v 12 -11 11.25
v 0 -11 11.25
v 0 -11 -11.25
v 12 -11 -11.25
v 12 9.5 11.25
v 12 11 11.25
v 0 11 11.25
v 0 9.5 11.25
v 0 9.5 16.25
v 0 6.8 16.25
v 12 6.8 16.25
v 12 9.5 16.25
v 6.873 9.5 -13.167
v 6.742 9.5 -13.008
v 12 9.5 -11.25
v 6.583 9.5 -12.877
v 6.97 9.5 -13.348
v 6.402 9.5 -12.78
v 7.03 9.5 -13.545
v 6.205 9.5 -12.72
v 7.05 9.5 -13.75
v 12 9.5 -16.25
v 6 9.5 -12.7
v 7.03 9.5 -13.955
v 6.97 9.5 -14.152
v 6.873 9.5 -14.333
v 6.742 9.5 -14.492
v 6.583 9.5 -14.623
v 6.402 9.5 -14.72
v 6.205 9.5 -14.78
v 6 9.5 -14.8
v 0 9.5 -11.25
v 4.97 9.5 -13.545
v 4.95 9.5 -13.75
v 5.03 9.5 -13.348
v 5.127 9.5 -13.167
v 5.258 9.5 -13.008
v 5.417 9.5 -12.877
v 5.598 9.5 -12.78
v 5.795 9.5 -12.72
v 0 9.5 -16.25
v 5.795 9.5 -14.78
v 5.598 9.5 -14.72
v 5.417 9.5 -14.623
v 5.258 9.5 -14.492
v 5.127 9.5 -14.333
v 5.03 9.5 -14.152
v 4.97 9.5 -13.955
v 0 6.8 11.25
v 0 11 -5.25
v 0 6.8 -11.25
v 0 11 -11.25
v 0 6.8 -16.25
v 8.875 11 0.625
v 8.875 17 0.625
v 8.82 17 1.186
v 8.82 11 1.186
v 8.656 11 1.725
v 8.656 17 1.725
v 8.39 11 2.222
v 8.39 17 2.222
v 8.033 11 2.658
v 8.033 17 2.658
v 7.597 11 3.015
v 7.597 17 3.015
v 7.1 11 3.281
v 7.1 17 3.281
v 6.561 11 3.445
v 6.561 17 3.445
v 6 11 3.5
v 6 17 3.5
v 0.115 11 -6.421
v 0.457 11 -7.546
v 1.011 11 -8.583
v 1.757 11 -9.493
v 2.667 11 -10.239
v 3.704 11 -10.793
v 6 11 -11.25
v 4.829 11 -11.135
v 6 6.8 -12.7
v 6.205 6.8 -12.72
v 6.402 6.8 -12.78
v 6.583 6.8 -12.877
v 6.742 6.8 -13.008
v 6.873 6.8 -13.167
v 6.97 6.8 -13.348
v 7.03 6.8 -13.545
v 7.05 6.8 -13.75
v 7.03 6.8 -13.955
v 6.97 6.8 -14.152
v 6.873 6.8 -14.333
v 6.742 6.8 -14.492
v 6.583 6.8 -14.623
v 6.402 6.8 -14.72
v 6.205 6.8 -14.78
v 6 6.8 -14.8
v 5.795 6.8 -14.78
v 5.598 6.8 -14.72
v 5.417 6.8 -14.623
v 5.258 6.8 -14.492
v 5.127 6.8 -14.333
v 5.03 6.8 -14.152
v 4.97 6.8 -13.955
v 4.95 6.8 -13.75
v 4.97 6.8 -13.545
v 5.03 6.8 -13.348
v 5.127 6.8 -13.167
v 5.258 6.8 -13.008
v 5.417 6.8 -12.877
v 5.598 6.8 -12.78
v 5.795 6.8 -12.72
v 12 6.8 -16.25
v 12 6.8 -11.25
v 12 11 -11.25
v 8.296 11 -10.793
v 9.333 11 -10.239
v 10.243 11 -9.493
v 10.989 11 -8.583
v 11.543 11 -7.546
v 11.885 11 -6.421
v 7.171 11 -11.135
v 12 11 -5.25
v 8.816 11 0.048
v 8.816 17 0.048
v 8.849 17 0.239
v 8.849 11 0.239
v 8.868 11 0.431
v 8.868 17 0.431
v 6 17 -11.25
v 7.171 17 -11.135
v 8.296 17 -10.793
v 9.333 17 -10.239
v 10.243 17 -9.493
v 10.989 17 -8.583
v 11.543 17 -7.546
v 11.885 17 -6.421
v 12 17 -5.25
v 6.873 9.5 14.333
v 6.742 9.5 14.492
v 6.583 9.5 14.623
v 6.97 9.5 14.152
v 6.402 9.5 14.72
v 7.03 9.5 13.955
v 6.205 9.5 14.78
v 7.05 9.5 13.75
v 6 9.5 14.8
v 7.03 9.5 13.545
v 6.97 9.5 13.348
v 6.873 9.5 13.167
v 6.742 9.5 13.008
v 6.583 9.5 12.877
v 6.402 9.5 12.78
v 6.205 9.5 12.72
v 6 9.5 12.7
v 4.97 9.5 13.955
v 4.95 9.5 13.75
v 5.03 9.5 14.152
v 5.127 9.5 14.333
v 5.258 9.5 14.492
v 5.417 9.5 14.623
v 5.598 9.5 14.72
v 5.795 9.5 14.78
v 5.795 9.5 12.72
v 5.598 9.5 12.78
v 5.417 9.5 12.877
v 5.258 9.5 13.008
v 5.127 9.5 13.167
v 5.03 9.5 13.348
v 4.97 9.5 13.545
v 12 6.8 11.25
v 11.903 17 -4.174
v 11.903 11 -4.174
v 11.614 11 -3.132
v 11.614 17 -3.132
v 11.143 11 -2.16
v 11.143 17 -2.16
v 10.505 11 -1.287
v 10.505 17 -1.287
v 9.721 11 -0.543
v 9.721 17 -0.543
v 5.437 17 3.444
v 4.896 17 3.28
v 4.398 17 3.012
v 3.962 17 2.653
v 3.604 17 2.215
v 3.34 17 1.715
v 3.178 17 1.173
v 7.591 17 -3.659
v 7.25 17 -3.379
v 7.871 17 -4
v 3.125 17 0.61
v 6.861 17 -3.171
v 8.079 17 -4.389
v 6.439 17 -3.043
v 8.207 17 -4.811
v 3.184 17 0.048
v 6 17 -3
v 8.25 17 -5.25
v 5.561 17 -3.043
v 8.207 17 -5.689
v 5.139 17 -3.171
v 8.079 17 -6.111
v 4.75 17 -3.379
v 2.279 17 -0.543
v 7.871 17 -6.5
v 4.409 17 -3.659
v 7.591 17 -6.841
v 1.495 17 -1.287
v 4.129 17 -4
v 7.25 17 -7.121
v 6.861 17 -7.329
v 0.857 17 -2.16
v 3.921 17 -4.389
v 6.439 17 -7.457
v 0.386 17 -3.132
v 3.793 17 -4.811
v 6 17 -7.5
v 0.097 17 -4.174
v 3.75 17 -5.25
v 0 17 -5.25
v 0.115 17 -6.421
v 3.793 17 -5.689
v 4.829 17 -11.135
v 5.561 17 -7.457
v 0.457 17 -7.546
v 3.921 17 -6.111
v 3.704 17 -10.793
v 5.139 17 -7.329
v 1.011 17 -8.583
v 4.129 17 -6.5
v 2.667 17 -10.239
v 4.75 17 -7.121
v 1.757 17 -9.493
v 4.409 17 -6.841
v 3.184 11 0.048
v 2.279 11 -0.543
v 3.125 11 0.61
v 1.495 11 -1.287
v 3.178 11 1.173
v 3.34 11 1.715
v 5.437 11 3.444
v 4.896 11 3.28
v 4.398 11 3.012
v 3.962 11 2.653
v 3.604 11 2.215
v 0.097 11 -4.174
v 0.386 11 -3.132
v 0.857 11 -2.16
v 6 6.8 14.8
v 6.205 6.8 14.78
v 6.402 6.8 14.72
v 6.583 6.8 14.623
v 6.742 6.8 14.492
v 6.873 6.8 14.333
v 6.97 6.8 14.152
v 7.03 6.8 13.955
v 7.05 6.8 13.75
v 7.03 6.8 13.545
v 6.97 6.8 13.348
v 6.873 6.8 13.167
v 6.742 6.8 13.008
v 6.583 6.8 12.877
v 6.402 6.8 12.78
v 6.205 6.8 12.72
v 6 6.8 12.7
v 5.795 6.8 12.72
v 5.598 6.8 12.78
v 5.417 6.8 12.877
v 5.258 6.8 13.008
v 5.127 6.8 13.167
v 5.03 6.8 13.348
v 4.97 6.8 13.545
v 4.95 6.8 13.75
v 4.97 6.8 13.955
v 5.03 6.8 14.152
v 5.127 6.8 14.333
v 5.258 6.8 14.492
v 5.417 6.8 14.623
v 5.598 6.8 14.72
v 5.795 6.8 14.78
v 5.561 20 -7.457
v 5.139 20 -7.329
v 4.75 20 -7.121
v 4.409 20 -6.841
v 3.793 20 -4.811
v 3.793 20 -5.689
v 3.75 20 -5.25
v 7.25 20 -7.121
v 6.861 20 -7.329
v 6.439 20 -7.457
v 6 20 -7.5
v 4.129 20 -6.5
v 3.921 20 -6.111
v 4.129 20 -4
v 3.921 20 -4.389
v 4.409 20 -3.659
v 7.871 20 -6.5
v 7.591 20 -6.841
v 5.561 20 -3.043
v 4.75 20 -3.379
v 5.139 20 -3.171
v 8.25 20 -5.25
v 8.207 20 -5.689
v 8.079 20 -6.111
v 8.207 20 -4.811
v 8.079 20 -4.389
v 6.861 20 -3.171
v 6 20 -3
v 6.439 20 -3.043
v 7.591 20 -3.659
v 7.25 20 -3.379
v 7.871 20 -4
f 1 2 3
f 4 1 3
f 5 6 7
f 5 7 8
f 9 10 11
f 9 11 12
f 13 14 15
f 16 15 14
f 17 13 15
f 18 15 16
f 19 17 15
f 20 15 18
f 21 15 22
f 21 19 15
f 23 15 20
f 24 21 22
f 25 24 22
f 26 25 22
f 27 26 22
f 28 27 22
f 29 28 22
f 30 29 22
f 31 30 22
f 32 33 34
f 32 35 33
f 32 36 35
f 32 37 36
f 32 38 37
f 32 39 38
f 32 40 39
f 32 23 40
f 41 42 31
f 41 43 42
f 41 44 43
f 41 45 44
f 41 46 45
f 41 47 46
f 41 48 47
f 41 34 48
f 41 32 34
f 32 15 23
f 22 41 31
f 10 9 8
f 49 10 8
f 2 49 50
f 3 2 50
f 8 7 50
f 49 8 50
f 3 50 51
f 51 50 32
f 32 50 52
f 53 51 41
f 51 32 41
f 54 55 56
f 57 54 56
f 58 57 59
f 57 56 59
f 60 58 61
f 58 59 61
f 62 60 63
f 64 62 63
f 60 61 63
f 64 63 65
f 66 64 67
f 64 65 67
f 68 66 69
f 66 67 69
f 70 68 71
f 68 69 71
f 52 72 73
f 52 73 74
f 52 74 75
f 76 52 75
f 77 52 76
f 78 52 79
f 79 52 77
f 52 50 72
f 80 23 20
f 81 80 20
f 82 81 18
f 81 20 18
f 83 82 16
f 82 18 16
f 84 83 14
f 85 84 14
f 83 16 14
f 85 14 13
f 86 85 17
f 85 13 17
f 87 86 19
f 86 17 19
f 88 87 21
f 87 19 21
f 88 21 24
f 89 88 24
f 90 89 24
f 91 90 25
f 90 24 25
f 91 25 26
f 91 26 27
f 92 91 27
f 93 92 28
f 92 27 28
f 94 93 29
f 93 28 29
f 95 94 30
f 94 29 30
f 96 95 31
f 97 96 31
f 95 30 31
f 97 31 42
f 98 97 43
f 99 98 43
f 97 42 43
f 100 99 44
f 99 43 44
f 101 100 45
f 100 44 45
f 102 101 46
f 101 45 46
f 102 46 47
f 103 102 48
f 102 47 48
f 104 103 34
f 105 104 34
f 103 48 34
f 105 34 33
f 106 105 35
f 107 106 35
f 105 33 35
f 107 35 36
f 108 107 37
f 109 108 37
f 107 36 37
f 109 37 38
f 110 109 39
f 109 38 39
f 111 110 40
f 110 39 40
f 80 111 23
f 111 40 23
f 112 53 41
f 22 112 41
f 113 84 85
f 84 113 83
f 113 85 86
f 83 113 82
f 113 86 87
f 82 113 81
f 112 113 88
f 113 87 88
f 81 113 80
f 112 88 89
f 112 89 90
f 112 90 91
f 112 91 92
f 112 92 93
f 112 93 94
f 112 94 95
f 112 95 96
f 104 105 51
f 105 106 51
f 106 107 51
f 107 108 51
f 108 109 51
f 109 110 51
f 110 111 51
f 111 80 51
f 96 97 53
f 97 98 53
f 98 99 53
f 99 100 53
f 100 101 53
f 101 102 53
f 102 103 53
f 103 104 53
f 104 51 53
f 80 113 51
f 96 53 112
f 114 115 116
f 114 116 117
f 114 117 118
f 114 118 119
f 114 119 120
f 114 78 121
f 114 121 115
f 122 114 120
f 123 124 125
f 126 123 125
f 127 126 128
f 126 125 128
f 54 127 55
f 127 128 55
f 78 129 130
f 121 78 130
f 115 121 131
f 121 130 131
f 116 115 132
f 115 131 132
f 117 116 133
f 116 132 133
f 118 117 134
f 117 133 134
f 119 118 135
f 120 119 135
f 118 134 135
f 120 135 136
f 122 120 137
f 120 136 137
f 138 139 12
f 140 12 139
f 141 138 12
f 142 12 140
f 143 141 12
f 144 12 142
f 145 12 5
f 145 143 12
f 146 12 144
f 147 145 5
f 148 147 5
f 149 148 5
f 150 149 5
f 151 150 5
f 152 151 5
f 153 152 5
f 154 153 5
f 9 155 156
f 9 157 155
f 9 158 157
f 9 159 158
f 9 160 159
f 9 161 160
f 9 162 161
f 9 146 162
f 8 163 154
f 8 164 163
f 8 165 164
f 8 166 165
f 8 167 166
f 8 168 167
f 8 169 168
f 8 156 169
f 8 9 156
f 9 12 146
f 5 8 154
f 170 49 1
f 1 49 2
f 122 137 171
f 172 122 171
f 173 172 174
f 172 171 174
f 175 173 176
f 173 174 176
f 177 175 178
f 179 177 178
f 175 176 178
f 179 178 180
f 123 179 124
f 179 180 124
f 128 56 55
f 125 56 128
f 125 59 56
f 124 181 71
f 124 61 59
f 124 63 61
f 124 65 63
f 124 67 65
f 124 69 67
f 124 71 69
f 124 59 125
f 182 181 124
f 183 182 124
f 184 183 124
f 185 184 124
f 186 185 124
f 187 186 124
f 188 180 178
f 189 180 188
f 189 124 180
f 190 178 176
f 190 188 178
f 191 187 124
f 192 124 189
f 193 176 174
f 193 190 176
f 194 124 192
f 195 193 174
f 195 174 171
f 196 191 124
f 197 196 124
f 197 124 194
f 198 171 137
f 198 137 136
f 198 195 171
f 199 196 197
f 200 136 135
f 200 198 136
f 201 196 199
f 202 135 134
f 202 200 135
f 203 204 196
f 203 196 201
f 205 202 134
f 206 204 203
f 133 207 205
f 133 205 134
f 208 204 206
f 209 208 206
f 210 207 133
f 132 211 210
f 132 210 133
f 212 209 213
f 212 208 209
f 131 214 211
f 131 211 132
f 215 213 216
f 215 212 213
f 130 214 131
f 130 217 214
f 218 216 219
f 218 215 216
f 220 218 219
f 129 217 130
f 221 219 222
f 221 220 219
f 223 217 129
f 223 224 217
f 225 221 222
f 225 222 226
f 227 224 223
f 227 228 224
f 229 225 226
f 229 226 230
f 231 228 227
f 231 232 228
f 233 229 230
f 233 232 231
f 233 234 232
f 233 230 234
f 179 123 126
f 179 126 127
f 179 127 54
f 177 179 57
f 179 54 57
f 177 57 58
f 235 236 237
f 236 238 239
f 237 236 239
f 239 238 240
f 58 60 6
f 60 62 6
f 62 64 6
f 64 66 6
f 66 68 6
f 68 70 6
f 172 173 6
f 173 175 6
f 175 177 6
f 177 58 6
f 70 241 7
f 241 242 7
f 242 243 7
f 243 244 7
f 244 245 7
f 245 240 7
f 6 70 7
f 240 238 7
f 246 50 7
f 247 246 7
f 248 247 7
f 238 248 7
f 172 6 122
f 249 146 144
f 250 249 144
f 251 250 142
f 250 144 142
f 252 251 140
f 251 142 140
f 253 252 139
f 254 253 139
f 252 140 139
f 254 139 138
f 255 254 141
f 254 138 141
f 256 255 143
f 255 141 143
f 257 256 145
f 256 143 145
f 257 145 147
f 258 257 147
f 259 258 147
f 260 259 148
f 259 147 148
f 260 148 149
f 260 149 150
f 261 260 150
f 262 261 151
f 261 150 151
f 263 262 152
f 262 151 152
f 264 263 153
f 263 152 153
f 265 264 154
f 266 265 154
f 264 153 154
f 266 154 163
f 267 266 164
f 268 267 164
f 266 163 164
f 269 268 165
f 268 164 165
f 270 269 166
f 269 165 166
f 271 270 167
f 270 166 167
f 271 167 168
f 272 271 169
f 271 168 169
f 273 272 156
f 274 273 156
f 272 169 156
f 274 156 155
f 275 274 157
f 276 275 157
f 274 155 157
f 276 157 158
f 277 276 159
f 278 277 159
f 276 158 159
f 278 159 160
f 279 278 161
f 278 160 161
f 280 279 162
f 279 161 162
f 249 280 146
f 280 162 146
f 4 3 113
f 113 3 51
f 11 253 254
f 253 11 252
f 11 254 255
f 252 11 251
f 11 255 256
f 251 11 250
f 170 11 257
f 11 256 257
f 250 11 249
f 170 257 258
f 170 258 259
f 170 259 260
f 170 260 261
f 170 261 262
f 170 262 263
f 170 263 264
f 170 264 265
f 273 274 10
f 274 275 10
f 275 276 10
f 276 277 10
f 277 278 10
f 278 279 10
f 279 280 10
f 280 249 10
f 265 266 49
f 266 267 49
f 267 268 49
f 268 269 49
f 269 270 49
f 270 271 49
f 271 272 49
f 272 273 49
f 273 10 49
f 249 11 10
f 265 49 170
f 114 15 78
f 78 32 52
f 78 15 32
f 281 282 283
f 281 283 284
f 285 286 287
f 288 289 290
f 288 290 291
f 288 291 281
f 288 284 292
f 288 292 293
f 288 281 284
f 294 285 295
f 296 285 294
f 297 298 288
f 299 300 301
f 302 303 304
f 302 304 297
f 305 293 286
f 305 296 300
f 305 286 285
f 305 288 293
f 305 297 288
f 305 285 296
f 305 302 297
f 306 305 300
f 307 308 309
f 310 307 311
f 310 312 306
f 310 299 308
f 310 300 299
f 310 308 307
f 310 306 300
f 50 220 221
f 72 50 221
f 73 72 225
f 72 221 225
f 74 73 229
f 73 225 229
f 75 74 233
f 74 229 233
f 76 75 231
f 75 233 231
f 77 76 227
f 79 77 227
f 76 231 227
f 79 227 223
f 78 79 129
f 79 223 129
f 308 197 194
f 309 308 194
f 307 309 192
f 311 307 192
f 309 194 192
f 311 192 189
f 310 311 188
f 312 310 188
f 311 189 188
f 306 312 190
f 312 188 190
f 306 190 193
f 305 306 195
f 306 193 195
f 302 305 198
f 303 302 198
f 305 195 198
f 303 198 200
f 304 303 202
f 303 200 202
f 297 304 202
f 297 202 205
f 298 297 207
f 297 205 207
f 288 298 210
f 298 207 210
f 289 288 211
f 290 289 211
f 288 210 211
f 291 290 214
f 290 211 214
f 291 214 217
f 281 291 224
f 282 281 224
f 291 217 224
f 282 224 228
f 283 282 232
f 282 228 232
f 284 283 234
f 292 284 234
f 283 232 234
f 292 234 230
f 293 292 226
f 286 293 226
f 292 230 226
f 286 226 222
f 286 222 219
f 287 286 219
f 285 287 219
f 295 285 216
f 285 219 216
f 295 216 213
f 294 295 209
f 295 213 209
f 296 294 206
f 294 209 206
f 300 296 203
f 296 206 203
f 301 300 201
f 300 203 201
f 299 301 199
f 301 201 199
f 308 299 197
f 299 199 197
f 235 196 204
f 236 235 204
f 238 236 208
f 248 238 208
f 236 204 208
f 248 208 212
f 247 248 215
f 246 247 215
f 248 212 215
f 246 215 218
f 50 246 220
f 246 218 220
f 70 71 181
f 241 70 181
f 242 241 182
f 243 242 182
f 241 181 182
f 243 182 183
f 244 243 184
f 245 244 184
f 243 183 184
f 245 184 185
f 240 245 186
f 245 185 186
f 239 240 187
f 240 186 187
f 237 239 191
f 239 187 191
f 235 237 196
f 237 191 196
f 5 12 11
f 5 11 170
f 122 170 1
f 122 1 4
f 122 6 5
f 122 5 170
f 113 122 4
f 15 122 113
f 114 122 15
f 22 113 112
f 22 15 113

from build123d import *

# Parameters (mm, degrees)
SKETCH1_W           = 5
SKETCH1_H           = 2.7
SKETCH1_W_2         = 14.75
SKETCH1_H_2         = 6
BOSS_EXTRUDE1_DEPTH = 12
CUT_EXTRUDE1_DEPTH  = 6
SKETCH3_R           = 1.05
CUT_EXTRUDE2_DEPTH  = 2.7
SKETCH4_R           = 2.25
BOSS_EXTRUDE3_DEPTH = 3


with BuildPart() as part:
    # Sketch1 → Boss-Extrude1 (new body)
    with BuildSketch(Plane(origin=(0, 0, 0), x_dir=(0, 0, -1), z_dir=(1, 0, 0))):
        Polygon((-11.25, 6.8), (-11.25, -11), (11.25, -11), (11.25, 6.8), (11.25, 9.5), (11.25, 11), (-3.5, 11), (-11.25, 11), (-11.25, 9.5), align=None)
        with Locations((-13.75, 8.15)):
            Rectangle(SKETCH1_W, SKETCH1_H)
        with Locations((13.75, 8.15)):
            Rectangle(SKETCH1_W, SKETCH1_H)
        with Locations((3.875, 14)):
            Rectangle(SKETCH1_W_2, SKETCH1_H_2)
    extrude(amount=BOSS_EXTRUDE1_DEPTH)

    # Sketch2 → Cut-Extrude1 (cut)
    with BuildSketch(Plane(origin=(0, 17, 0), x_dir=(1, 0, 0), z_dir=(0, 1, 0))):
        with BuildLine():
            ThreePointArc((0, 5.25), (1.757359313, 9.492640687), (6, 11.25))
            Line((6, 11.25), (0, 11.25))
            Line((0, 11.25), (0, 5.25))
        make_face()
        with BuildLine():
            Line((12, 11.25), (6, 11.25))
            ThreePointArc((6, 11.25), (10.242640687, 9.492640687), (12, 5.25))
            Line((12, 5.25), (12, 11.25))
        make_face()
        with BuildLine():
            Line((12, -3.5), (12, 5.25))
            ThreePointArc((12, 5.25), (11.142901339, 2.159601026), (8.81647806, -0.04787234))
            ThreePointArc((8.81647806, -0.04787234), (8.860332098, -0.334956403), (8.875, -0.625))
            ThreePointArc((8.875, -0.625), (8.032931996, -2.657931996), (6, -3.5))
            Line((6, -3.5), (12, -3.5))
        make_face()
        with BuildLine():
            ThreePointArc((3.18352194, -0.04787234), (0.857098661, 2.159601026), (0, 5.25))
            Line((0, 5.25), (0, -3.5))
            Line((0, -3.5), (6, -3.5))
            ThreePointArc((6, -3.5), (3.772347983, -2.442468429), (3.18352194, -0.04787234))
        make_face()
    extrude(amount=-CUT_EXTRUDE1_DEPTH, mode=Mode.SUBTRACT)

    # Sketch3 → Cut-Extrude2 (cut)
    with BuildSketch(Plane(origin=(0, 9.5, 0), x_dir=(1, 0, 0), z_dir=(0, 1, 0))):
        with Locations(Location((6, -13.75, 0), (0, 0, 270))):
            Circle(SKETCH3_R)
        with Locations(Location((6, 13.75, 0), (0, 0, 270))):
            Circle(SKETCH3_R)
    extrude(amount=-CUT_EXTRUDE2_DEPTH, mode=Mode.SUBTRACT)

    # Sketch4 → Boss-Extrude3 (add)
    with BuildSketch(Plane(origin=(0, 17, 0), x_dir=(1, 0, 0), z_dir=(0, 1, 0))):
        with Locations(Location((6, 5.25, 0), (0, 0, 270))):
            Circle(SKETCH4_R)
    extrude(amount=BOSS_EXTRUDE3_DEPTH)


solid = part.part
